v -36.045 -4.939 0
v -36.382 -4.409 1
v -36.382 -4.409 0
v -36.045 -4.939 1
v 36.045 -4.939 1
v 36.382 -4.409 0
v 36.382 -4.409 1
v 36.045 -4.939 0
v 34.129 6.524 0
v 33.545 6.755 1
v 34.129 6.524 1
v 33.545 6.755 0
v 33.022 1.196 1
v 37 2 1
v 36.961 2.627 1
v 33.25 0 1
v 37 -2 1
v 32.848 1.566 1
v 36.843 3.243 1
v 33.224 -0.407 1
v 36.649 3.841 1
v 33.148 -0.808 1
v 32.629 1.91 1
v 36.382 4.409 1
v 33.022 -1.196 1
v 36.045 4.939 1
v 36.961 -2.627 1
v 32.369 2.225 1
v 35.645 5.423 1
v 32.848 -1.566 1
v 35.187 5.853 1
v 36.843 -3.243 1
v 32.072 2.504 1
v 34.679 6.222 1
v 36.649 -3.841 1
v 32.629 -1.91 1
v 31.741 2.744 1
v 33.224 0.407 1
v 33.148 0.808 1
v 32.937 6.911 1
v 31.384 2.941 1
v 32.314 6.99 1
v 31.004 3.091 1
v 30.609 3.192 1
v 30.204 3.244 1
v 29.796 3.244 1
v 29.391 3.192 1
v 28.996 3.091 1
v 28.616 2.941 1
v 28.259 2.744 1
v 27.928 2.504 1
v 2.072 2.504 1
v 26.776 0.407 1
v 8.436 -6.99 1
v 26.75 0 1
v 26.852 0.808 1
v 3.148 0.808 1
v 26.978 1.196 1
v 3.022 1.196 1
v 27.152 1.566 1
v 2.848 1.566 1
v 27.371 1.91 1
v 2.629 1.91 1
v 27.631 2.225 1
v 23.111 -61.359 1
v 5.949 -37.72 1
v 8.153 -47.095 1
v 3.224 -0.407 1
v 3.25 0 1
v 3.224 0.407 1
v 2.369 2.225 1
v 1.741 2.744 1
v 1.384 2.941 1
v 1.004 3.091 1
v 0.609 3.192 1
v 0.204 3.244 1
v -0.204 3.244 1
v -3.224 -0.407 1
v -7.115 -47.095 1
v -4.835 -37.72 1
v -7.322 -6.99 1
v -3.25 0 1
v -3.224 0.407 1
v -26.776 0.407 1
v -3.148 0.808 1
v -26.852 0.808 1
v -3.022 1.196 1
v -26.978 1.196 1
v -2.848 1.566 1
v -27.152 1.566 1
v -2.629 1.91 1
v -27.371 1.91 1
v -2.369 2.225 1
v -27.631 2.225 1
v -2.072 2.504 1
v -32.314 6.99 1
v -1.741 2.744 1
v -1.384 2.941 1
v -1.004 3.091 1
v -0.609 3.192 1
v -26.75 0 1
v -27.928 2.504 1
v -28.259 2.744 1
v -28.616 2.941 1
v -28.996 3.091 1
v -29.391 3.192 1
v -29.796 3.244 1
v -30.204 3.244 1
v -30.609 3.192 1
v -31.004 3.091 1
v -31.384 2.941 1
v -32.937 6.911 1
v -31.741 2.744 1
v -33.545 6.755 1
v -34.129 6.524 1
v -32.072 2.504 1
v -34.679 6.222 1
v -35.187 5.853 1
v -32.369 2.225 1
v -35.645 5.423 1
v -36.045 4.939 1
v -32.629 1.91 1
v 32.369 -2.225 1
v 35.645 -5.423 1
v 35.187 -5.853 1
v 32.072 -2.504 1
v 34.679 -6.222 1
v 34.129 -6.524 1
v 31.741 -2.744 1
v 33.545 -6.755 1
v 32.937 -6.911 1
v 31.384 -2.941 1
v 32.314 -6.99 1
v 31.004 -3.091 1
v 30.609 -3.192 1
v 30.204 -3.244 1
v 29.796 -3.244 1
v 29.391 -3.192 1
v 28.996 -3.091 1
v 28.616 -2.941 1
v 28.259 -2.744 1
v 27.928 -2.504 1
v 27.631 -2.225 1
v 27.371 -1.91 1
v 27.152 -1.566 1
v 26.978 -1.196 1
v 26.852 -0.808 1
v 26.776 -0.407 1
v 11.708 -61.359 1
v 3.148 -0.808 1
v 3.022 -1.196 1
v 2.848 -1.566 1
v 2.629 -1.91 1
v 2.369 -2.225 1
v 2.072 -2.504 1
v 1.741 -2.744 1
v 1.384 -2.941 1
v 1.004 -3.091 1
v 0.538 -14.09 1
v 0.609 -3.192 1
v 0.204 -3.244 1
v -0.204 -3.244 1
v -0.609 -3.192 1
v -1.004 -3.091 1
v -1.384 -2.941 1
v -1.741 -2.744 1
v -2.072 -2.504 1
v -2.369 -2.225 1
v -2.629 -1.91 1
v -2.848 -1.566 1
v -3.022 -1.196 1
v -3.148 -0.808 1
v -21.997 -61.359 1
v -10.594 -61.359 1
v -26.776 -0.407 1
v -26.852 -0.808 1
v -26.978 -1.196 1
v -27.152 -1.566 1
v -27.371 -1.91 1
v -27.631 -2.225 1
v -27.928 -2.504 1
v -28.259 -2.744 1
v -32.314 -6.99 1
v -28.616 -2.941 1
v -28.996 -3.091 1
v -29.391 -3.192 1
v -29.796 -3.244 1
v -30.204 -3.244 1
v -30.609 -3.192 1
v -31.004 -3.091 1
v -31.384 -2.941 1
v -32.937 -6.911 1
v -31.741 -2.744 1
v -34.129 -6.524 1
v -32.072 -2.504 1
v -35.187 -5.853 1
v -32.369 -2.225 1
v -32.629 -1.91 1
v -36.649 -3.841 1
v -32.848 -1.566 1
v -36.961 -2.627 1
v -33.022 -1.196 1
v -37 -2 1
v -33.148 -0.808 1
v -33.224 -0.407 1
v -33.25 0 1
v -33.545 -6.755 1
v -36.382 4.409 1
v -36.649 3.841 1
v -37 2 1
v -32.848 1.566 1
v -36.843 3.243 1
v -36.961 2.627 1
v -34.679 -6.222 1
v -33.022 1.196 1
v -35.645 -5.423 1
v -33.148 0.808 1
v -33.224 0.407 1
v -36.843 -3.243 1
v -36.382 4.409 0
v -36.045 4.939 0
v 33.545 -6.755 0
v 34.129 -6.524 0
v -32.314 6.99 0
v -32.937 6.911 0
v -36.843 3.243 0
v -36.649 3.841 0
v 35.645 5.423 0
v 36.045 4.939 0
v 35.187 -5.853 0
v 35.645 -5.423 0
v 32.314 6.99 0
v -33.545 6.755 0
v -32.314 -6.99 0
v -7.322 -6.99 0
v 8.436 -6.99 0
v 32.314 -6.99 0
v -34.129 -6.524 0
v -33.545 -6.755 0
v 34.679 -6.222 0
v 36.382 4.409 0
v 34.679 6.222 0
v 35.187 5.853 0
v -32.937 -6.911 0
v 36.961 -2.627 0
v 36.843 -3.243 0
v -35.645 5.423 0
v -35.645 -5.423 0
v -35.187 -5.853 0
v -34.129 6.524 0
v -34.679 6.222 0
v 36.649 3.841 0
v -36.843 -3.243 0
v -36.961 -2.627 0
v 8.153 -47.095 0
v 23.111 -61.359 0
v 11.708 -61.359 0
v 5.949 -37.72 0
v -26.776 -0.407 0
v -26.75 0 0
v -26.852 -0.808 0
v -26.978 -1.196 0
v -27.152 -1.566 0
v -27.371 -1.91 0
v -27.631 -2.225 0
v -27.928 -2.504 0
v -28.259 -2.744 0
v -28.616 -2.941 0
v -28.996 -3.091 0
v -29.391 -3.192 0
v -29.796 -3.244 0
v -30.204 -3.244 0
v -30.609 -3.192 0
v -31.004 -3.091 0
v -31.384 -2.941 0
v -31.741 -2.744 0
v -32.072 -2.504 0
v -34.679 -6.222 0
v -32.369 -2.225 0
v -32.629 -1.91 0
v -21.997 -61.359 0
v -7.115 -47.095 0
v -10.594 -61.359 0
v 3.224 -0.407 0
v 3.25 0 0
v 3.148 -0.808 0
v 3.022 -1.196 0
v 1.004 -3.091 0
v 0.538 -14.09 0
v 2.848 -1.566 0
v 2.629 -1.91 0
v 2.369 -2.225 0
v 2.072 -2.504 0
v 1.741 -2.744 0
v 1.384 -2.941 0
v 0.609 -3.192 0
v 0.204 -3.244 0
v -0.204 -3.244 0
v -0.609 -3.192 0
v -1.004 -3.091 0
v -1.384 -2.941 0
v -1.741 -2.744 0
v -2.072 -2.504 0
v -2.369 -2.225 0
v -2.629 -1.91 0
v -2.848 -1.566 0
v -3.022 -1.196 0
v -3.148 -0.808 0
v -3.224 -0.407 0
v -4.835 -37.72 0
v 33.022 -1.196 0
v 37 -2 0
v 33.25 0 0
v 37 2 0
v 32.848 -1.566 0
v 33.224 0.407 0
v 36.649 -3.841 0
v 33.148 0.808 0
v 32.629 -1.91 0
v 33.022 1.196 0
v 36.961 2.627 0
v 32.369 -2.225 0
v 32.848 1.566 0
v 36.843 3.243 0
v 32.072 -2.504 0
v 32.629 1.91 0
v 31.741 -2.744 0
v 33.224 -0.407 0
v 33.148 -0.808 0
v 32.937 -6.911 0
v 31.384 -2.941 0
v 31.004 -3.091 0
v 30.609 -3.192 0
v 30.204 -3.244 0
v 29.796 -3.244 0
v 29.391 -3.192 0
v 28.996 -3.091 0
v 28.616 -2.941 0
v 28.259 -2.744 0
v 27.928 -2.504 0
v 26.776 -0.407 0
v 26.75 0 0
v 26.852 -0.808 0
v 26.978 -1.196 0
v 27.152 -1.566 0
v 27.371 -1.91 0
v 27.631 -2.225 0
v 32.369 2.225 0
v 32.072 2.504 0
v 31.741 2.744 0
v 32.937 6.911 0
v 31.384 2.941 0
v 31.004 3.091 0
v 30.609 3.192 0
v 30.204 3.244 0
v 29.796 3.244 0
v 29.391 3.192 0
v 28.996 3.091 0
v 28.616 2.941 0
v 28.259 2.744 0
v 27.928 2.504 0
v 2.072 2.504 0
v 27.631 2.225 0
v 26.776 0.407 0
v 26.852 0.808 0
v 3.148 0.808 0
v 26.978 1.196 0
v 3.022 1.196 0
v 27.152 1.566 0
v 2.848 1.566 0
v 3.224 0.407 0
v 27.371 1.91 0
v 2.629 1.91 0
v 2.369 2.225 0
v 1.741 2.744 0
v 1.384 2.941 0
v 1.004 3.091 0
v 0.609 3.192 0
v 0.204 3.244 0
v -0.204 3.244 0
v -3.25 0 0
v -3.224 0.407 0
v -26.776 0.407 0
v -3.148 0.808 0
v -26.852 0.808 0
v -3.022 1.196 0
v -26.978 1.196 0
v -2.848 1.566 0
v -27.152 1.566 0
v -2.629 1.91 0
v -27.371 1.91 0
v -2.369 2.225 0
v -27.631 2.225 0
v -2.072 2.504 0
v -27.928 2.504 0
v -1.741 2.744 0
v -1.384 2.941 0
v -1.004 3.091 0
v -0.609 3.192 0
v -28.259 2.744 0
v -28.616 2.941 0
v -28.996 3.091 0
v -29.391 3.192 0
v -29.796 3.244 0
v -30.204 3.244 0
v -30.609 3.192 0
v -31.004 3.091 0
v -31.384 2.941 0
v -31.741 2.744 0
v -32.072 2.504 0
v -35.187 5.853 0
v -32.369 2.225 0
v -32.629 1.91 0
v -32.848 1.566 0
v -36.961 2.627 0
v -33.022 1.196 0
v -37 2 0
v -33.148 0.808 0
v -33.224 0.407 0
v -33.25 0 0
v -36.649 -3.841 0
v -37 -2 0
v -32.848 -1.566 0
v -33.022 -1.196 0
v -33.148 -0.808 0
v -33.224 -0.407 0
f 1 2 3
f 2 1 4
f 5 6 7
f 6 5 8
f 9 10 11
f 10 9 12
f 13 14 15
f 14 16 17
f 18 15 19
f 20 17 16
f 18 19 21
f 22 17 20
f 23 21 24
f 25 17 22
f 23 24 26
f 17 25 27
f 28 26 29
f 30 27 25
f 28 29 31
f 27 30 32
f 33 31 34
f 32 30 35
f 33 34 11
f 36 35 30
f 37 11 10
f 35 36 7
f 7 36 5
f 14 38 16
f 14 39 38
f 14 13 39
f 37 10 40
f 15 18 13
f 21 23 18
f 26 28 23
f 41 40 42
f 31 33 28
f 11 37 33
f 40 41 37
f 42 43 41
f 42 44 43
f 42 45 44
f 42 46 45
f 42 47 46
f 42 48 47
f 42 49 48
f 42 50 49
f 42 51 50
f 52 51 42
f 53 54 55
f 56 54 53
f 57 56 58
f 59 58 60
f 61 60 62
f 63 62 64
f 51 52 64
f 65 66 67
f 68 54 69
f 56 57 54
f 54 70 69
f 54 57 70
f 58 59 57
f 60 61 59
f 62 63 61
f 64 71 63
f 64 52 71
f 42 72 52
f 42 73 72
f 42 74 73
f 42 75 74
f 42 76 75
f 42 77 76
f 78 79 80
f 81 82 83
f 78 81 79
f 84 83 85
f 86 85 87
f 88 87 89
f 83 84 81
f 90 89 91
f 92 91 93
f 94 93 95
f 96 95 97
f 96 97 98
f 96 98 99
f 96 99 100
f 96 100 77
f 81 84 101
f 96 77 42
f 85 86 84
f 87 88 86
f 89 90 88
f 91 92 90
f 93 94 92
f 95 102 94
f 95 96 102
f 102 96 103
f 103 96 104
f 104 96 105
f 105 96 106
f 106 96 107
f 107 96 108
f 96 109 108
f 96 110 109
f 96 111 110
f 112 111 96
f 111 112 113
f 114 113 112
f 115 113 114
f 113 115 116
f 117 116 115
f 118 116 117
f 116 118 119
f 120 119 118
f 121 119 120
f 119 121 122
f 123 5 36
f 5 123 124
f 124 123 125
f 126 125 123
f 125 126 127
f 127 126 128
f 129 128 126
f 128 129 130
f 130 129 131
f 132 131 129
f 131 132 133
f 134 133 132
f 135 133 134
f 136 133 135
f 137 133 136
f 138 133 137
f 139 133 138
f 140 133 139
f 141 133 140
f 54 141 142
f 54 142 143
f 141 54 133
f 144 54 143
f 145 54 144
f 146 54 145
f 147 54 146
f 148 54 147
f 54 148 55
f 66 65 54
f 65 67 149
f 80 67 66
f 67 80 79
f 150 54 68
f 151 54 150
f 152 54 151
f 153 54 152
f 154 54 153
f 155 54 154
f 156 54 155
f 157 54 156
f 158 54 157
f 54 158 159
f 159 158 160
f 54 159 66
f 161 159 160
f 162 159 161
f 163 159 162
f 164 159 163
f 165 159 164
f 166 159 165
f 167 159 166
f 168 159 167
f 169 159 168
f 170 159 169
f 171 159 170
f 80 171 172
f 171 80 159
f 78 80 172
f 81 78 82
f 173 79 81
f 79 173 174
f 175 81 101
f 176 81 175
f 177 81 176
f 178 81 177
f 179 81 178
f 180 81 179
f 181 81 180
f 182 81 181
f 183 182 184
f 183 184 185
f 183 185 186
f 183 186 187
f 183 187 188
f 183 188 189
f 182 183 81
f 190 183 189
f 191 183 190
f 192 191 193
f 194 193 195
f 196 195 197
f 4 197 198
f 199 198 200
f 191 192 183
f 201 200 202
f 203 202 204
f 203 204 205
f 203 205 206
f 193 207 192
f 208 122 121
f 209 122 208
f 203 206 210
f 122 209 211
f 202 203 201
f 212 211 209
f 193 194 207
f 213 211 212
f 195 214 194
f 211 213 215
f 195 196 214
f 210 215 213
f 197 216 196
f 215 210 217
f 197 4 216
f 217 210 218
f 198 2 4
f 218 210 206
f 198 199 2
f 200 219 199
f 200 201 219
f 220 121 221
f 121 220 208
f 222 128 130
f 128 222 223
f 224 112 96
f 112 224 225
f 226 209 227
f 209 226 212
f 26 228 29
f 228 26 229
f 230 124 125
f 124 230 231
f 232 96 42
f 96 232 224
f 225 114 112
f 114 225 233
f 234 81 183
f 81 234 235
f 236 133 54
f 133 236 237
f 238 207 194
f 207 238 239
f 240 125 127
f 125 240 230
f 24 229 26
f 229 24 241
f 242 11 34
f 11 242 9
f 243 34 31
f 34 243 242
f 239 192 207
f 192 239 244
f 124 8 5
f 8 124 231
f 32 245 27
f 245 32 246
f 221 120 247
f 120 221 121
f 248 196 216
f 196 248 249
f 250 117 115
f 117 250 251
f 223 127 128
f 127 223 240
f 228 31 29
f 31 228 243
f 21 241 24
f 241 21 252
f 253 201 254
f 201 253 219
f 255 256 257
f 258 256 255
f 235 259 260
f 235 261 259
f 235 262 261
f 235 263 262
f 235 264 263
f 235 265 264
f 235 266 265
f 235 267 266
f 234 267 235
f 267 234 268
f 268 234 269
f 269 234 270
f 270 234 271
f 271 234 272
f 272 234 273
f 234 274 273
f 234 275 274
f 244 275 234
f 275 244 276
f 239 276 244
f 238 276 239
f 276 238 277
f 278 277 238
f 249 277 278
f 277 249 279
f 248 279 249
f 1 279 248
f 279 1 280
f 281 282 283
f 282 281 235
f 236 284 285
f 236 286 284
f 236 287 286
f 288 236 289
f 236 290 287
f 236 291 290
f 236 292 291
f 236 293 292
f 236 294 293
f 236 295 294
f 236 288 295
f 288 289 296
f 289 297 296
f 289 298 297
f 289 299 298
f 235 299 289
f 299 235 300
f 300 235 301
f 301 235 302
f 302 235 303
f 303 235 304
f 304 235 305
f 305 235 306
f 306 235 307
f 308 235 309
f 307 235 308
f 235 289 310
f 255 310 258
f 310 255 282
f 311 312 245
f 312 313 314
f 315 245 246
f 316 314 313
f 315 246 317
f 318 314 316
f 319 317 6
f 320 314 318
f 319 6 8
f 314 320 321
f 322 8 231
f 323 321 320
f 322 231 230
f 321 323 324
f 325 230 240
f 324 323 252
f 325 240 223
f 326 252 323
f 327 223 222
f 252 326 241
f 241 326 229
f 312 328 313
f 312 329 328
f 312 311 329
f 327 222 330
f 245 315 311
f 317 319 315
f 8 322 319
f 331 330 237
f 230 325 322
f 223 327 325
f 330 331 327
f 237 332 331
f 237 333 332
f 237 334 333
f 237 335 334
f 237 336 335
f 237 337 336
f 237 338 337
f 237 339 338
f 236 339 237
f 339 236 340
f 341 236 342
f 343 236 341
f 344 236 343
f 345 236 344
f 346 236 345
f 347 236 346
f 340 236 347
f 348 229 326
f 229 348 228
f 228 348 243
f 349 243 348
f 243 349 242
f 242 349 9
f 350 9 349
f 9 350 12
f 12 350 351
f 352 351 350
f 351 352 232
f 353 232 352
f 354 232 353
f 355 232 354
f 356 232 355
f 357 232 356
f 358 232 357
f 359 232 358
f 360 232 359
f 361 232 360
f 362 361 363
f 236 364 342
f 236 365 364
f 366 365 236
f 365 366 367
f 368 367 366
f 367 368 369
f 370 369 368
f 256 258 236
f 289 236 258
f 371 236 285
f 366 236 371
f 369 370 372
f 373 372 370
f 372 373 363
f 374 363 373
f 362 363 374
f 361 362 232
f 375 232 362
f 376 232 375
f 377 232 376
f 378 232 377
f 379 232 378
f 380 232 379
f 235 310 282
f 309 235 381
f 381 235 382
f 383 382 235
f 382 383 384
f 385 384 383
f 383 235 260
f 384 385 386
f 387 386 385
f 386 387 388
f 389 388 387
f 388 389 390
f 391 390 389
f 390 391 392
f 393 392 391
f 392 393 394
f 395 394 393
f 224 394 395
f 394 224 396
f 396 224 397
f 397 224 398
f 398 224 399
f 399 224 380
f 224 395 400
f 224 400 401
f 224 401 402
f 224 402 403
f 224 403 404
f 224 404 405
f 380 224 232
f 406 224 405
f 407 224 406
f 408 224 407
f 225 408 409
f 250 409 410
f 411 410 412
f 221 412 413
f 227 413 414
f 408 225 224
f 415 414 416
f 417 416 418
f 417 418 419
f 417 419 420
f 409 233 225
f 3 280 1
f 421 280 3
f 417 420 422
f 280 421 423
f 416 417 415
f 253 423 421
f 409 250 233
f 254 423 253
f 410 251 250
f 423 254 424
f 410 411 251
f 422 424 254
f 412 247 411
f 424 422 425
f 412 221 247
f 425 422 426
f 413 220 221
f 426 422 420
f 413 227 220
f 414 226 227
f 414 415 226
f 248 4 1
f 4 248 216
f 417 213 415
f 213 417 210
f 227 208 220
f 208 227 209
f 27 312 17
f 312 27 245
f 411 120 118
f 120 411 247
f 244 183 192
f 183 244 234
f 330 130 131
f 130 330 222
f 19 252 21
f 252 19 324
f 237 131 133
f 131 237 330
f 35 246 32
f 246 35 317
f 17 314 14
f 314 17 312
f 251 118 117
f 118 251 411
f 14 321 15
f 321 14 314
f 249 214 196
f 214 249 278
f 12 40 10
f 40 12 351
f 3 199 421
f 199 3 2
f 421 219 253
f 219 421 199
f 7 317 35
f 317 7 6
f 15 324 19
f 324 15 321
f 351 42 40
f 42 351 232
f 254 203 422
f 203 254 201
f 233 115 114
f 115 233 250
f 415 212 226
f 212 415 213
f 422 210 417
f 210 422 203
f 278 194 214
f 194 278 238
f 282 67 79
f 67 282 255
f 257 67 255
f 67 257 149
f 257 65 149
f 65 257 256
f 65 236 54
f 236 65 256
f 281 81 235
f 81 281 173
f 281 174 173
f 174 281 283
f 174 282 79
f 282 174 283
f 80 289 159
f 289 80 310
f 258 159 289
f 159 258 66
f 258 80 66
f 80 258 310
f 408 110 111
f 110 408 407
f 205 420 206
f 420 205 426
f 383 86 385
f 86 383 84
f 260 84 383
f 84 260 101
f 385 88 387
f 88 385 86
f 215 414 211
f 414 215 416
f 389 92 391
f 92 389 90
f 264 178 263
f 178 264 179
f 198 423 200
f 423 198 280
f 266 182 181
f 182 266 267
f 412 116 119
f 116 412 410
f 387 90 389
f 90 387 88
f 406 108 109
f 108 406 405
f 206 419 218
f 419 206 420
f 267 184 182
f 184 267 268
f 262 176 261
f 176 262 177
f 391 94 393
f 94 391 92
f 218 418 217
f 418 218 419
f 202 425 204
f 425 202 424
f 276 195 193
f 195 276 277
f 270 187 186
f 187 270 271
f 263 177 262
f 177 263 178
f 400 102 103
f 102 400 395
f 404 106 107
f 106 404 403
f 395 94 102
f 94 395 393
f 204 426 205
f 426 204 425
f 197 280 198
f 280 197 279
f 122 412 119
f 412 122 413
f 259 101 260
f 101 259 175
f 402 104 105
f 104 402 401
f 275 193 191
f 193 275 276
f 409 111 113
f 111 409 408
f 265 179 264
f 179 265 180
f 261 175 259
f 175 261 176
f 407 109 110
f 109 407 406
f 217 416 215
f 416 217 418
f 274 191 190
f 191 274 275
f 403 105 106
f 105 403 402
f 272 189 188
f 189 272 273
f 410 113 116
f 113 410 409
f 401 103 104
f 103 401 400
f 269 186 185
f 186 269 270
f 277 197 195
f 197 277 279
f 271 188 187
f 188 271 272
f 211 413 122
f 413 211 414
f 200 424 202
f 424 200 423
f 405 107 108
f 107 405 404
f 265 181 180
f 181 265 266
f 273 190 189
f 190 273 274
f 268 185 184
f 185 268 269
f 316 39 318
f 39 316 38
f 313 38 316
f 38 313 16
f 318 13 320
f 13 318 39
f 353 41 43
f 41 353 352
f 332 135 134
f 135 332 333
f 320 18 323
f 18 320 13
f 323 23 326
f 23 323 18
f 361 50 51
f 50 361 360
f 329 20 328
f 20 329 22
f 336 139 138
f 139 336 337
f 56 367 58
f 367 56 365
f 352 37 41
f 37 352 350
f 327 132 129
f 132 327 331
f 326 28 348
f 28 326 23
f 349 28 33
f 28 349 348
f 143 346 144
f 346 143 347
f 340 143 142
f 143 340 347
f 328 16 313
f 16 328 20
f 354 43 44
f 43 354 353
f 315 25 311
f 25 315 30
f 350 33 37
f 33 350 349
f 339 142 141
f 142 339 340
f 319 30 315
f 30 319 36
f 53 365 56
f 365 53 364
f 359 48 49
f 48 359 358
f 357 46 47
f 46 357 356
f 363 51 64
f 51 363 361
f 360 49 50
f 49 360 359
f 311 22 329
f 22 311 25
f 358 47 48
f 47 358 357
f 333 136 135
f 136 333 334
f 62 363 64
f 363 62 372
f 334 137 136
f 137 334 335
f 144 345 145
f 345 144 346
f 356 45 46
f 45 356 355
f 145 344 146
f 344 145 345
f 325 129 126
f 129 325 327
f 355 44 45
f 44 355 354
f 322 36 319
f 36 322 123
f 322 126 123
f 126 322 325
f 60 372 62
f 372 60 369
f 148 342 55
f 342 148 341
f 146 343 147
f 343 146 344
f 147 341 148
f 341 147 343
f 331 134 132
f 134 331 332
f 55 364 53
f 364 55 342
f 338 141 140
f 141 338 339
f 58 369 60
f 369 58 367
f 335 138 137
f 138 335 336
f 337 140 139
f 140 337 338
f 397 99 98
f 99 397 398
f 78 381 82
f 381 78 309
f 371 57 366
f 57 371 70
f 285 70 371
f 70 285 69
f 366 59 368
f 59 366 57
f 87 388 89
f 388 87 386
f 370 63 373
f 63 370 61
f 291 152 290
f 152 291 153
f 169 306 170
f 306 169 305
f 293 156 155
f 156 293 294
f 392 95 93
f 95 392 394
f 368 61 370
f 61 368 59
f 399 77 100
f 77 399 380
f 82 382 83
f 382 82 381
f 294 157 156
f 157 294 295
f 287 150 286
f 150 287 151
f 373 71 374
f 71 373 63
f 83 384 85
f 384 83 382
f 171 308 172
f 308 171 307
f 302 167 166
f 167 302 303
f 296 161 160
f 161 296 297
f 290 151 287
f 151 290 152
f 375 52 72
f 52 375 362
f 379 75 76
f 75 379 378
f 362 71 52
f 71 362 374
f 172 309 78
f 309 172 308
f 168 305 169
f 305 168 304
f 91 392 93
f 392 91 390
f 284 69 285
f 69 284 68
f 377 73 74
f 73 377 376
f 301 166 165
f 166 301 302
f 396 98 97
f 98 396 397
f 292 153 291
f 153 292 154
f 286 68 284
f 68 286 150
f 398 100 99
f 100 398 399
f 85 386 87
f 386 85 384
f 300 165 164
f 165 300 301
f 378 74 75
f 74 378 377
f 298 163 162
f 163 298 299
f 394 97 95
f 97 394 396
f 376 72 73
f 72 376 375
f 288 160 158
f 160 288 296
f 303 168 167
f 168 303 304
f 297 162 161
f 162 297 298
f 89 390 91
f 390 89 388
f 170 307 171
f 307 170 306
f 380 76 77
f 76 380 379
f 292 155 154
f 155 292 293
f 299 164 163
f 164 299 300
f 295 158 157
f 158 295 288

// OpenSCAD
$fn = 50;


difference() {
	union() {
		translate(v = [0, 0, 0]) {
			rotate(a = [0, 0, 0]) {
				hull() {
					translate(v = [-32.0000000000, 2.0000000000, 0]) {
						rotate(a = [0, 0, 0]) {
							translate(v = [0, 0, 0]) {
								rotate(a = [0, 0, 0]) {
									cylinder(h = 1, r = 5);
								}
							}
						}
					}
					translate(v = [32.0000000000, 2.0000000000, 0]) {
						rotate(a = [0, 0, 0]) {
							translate(v = [0, 0, 0]) {
								rotate(a = [0, 0, 0]) {
									cylinder(h = 1, r = 5);
								}
							}
						}
					}
					translate(v = [-32.0000000000, -2.0000000000, 0]) {
						rotate(a = [0, 0, 0]) {
							translate(v = [0, 0, 0]) {
								rotate(a = [0, 0, 0]) {
									cylinder(h = 1, r = 5);
								}
							}
						}
					}
					translate(v = [32.0000000000, -2.0000000000, 0]) {
						rotate(a = [0, 0, 0]) {
							translate(v = [0, 0, 0]) {
								rotate(a = [0, 0, 0]) {
									cylinder(h = 1, r = 5);
								}
							}
						}
					}
				}
			}
		}
		translate(v = [0, -5, 0]) {
			rotate(a = [0, 0, 0]) {
				linear_extrude(height = 1) {
					text(font = "DejaVu Sans Mono:style=Bold", halign = "center", size = 57.0000000000, text = "A", valign = "top");
				}
			}
		}
	}
	union() {
		translate(v = [-30.0000000000, 0.0000000000, -125.0000000000]) {
			rotate(a = [0, 0, 0]) {
				cylinder(h = 250, r = 3.2500000000);
			}
		}
		translate(v = [30.0000000000, 0.0000000000, -125.0000000000]) {
			rotate(a = [0, 0, 0]) {
				cylinder(h = 250, r = 3.2500000000);
			}
		}
		translate(v = [30.0000000000, 0.0000000000, -125.0000000000]) {
			rotate(a = [0, 0, 0]) {
				cylinder(h = 250, r = 3.2500000000);
			}
		}
		translate(v = [0, 0, -125.0000000000]) {
			rotate(a = [0, 0, 0]) {
				cylinder(h = 250, r = 3.2500000000);
			}
		}
	}
}
